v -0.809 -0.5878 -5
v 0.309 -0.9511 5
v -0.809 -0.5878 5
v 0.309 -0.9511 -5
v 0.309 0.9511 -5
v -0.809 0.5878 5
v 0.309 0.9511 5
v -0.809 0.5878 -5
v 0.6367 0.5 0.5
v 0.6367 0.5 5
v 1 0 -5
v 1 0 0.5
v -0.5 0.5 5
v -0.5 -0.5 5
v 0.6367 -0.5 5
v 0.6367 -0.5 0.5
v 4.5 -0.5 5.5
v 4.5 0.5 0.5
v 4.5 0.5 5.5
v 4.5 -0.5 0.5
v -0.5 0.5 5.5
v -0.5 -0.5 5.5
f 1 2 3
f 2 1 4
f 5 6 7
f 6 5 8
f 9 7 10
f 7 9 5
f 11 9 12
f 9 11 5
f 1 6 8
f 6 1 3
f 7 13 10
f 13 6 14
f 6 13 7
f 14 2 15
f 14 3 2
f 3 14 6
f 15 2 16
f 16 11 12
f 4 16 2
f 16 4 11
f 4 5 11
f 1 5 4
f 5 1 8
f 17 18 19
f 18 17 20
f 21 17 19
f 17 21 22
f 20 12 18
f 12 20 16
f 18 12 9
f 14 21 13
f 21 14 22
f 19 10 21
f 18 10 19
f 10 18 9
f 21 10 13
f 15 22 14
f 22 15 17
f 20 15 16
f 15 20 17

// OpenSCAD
module example001()
{
	
	box = [5,1,5];
	union(){
		cylinder(r=1, h=10, center=true); 
		translate([2, 0, 3]) {
			cube(box, true);
		}
	}
	
}

example001();
